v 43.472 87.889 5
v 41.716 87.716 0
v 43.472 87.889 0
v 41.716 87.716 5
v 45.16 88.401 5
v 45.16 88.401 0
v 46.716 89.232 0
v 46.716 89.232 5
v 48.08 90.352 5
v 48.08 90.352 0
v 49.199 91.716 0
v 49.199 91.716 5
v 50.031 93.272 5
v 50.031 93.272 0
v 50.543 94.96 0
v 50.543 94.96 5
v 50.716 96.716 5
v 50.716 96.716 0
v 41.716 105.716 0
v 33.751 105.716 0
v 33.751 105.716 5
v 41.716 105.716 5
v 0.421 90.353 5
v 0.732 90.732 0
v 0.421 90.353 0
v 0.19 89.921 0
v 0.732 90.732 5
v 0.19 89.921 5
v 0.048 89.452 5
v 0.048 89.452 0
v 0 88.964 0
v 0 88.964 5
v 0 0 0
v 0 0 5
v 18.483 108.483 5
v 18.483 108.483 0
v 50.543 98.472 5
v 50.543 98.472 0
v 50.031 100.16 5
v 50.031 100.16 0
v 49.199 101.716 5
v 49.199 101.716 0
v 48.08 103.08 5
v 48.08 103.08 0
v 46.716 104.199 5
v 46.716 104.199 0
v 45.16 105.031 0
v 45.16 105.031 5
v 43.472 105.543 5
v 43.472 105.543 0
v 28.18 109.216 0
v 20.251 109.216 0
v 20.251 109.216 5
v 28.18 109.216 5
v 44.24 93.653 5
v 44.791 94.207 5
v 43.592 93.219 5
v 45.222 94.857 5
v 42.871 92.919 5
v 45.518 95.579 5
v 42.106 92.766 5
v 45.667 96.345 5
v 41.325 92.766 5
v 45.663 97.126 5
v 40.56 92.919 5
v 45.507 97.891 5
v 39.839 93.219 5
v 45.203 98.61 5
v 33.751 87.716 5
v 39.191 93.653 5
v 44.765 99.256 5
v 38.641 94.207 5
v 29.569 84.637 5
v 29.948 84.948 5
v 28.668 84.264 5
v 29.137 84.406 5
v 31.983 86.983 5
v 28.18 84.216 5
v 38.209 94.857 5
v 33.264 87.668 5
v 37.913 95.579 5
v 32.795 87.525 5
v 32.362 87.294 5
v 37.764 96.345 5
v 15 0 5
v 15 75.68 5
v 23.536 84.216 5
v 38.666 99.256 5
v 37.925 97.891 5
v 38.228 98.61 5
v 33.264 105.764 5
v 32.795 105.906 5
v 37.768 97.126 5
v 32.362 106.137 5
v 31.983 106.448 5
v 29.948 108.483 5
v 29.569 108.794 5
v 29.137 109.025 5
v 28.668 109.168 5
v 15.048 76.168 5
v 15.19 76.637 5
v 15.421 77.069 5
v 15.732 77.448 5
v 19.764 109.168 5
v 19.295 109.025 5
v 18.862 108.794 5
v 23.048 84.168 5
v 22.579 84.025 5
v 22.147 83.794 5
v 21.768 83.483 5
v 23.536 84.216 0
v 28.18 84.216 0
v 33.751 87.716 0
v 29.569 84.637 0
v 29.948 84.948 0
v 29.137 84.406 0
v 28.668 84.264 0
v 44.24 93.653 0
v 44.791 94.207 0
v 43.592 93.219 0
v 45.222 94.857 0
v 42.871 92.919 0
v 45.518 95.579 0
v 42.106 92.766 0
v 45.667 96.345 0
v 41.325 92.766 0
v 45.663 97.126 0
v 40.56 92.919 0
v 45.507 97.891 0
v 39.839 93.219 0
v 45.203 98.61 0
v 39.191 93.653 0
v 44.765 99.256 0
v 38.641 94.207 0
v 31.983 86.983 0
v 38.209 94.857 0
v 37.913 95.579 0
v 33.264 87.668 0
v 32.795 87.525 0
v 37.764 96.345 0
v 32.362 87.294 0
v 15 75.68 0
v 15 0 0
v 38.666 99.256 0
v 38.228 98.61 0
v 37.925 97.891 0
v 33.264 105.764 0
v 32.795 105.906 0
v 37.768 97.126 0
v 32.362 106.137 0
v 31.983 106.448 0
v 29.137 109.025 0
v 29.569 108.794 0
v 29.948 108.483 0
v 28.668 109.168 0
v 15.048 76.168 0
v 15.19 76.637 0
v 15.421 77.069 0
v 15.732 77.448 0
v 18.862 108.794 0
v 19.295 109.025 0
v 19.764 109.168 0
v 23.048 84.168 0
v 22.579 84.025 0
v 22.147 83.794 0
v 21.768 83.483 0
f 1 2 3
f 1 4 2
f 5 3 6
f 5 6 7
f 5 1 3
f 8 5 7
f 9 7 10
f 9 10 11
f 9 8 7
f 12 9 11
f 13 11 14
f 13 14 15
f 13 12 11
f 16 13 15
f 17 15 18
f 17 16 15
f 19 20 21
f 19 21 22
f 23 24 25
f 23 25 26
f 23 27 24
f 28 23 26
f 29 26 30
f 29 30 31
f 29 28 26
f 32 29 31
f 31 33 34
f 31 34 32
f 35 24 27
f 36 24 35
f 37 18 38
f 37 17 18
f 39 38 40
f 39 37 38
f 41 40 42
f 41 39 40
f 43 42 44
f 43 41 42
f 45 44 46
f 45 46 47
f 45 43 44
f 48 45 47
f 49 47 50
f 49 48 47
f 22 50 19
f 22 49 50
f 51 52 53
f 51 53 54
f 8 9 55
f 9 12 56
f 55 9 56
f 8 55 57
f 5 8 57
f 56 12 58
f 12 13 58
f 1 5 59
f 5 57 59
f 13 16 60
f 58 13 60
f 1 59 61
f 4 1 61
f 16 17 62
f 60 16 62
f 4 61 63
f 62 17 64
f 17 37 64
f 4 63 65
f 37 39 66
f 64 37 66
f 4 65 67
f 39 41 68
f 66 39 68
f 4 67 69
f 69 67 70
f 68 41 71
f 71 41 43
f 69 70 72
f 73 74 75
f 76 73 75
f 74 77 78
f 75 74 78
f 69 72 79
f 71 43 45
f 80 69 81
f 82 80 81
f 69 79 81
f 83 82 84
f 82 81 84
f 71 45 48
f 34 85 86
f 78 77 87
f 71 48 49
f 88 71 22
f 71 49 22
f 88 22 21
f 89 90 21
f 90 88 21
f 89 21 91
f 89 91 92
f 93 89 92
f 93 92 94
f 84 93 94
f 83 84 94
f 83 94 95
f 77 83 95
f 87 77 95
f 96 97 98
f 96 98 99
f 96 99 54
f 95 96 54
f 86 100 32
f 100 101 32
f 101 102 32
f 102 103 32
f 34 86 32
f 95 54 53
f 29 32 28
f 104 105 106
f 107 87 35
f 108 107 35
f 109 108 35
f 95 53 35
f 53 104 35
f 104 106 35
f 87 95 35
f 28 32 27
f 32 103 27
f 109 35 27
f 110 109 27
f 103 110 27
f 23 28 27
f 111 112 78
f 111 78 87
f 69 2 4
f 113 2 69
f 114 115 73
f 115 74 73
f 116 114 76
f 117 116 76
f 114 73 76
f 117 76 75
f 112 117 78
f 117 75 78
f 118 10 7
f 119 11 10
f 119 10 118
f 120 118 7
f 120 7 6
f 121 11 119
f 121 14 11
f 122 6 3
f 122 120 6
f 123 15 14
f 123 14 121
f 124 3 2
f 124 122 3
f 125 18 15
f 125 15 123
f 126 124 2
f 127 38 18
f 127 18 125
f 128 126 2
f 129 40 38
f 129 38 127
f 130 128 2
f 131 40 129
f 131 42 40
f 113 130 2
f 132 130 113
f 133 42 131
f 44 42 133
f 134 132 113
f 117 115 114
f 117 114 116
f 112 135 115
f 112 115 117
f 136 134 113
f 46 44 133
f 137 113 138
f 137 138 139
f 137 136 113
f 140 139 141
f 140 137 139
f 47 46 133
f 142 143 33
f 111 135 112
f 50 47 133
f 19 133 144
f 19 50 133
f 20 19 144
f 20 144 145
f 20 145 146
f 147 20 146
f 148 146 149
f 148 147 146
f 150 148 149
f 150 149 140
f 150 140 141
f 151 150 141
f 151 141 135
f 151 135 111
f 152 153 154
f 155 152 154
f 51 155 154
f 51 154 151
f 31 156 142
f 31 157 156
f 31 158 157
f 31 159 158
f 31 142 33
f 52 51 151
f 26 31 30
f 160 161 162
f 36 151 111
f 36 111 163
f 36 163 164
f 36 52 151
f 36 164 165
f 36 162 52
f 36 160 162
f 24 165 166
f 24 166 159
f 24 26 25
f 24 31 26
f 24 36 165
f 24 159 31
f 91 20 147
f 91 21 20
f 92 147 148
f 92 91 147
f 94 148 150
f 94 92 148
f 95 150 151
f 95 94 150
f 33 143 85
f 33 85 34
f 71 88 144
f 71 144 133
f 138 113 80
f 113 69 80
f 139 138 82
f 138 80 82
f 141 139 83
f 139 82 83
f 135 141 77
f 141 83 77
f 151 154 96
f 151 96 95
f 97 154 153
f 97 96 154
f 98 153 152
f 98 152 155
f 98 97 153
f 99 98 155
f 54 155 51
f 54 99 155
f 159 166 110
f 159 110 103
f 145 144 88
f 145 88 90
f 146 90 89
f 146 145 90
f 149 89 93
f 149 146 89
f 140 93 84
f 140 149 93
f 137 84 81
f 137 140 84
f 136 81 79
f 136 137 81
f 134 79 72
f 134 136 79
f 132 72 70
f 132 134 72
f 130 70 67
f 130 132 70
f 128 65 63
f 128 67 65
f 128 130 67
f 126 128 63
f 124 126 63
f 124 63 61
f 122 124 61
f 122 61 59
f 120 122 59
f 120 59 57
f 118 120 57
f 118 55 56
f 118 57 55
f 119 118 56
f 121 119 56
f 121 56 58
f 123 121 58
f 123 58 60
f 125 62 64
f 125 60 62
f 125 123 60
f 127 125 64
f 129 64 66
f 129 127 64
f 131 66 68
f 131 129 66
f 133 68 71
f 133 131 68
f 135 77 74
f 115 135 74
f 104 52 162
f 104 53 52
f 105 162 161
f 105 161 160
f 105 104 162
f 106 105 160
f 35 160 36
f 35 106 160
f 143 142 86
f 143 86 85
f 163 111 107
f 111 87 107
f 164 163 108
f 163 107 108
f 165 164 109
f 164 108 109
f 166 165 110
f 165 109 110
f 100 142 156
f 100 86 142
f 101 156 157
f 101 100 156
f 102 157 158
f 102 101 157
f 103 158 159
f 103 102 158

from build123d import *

# Parameters (mm, degrees)
ESQUISSE2_R        = 3.96875
BOSS_EXTRU_6_DEPTH = 5
BOSS_EXTRU_7_DEPTH = 5
CONG_1_R           = 9
CONG_2_R           = 2.5


with BuildPart() as part:
    # Esquisse2 → Boss.-Extru.6 (new body)
    with BuildSketch(Plane.XY):
        Polygon((0, 0), (0, 90), (19.215728753, 109.215728753), (29.215728753, 109.215728753), (32.715728753, 105.715728753), (50.715728753, 105.715728753), (50.715728753, 87.715728753), (32.715728753, 87.715728753), (29.215728753, 84.215728753), (22.5, 84.215728753), (15, 76.715728753), (15, 0), align=None)
        with Locations((41.715728753, 96.715728753)):
            Circle(ESQUISSE2_R, mode=Mode.SUBTRACT)
    extrude(amount=BOSS_EXTRU_6_DEPTH)

    # Esquisse3 → Boss.-Extru.7 (add, through all)
    with BuildSketch(Plane.XY.offset(5)):
        with BuildLine():
            Line((38.666240834, 99.255728753), (44.765216671, 99.255728753))
            ThreePointArc((44.765216671, 99.255728753), (41.715728753, 100.684478753), (38.666240834, 99.255728753))
        make_face()
    extrude(amount=-BOSS_EXTRU_7_DEPTH)

    # Congé1
    cong_1_edges = [part.edges().sort_by_distance(p)[0] for p in [
        (50.715728753, 87.715728753, 2.5),
        (50.715728753, 105.715728753, 2.5),
    ]]
    fillet(cong_1_edges, radius=CONG_1_R - 0.0001)  # a hair under: the kernel refuses the full size

    # Congé2
    cong_2_edges = [part.edges().sort_by_distance(p)[0] for p in [
        (0, 90, 2.5),
        (19.215728753, 109.215728753, 2.5),
        (29.215728753, 109.215728753, 2.5),
        (32.715728753, 105.715728753, 2.5),
        (32.715728753, 87.715728753, 2.5),
        (29.215728753, 84.215728753, 2.5),
        (22.5, 84.215728753, 2.5),
        (15, 76.715728753, 2.5),
    ]]
    fillet(cong_2_edges, radius=CONG_2_R)


solid = part.part
